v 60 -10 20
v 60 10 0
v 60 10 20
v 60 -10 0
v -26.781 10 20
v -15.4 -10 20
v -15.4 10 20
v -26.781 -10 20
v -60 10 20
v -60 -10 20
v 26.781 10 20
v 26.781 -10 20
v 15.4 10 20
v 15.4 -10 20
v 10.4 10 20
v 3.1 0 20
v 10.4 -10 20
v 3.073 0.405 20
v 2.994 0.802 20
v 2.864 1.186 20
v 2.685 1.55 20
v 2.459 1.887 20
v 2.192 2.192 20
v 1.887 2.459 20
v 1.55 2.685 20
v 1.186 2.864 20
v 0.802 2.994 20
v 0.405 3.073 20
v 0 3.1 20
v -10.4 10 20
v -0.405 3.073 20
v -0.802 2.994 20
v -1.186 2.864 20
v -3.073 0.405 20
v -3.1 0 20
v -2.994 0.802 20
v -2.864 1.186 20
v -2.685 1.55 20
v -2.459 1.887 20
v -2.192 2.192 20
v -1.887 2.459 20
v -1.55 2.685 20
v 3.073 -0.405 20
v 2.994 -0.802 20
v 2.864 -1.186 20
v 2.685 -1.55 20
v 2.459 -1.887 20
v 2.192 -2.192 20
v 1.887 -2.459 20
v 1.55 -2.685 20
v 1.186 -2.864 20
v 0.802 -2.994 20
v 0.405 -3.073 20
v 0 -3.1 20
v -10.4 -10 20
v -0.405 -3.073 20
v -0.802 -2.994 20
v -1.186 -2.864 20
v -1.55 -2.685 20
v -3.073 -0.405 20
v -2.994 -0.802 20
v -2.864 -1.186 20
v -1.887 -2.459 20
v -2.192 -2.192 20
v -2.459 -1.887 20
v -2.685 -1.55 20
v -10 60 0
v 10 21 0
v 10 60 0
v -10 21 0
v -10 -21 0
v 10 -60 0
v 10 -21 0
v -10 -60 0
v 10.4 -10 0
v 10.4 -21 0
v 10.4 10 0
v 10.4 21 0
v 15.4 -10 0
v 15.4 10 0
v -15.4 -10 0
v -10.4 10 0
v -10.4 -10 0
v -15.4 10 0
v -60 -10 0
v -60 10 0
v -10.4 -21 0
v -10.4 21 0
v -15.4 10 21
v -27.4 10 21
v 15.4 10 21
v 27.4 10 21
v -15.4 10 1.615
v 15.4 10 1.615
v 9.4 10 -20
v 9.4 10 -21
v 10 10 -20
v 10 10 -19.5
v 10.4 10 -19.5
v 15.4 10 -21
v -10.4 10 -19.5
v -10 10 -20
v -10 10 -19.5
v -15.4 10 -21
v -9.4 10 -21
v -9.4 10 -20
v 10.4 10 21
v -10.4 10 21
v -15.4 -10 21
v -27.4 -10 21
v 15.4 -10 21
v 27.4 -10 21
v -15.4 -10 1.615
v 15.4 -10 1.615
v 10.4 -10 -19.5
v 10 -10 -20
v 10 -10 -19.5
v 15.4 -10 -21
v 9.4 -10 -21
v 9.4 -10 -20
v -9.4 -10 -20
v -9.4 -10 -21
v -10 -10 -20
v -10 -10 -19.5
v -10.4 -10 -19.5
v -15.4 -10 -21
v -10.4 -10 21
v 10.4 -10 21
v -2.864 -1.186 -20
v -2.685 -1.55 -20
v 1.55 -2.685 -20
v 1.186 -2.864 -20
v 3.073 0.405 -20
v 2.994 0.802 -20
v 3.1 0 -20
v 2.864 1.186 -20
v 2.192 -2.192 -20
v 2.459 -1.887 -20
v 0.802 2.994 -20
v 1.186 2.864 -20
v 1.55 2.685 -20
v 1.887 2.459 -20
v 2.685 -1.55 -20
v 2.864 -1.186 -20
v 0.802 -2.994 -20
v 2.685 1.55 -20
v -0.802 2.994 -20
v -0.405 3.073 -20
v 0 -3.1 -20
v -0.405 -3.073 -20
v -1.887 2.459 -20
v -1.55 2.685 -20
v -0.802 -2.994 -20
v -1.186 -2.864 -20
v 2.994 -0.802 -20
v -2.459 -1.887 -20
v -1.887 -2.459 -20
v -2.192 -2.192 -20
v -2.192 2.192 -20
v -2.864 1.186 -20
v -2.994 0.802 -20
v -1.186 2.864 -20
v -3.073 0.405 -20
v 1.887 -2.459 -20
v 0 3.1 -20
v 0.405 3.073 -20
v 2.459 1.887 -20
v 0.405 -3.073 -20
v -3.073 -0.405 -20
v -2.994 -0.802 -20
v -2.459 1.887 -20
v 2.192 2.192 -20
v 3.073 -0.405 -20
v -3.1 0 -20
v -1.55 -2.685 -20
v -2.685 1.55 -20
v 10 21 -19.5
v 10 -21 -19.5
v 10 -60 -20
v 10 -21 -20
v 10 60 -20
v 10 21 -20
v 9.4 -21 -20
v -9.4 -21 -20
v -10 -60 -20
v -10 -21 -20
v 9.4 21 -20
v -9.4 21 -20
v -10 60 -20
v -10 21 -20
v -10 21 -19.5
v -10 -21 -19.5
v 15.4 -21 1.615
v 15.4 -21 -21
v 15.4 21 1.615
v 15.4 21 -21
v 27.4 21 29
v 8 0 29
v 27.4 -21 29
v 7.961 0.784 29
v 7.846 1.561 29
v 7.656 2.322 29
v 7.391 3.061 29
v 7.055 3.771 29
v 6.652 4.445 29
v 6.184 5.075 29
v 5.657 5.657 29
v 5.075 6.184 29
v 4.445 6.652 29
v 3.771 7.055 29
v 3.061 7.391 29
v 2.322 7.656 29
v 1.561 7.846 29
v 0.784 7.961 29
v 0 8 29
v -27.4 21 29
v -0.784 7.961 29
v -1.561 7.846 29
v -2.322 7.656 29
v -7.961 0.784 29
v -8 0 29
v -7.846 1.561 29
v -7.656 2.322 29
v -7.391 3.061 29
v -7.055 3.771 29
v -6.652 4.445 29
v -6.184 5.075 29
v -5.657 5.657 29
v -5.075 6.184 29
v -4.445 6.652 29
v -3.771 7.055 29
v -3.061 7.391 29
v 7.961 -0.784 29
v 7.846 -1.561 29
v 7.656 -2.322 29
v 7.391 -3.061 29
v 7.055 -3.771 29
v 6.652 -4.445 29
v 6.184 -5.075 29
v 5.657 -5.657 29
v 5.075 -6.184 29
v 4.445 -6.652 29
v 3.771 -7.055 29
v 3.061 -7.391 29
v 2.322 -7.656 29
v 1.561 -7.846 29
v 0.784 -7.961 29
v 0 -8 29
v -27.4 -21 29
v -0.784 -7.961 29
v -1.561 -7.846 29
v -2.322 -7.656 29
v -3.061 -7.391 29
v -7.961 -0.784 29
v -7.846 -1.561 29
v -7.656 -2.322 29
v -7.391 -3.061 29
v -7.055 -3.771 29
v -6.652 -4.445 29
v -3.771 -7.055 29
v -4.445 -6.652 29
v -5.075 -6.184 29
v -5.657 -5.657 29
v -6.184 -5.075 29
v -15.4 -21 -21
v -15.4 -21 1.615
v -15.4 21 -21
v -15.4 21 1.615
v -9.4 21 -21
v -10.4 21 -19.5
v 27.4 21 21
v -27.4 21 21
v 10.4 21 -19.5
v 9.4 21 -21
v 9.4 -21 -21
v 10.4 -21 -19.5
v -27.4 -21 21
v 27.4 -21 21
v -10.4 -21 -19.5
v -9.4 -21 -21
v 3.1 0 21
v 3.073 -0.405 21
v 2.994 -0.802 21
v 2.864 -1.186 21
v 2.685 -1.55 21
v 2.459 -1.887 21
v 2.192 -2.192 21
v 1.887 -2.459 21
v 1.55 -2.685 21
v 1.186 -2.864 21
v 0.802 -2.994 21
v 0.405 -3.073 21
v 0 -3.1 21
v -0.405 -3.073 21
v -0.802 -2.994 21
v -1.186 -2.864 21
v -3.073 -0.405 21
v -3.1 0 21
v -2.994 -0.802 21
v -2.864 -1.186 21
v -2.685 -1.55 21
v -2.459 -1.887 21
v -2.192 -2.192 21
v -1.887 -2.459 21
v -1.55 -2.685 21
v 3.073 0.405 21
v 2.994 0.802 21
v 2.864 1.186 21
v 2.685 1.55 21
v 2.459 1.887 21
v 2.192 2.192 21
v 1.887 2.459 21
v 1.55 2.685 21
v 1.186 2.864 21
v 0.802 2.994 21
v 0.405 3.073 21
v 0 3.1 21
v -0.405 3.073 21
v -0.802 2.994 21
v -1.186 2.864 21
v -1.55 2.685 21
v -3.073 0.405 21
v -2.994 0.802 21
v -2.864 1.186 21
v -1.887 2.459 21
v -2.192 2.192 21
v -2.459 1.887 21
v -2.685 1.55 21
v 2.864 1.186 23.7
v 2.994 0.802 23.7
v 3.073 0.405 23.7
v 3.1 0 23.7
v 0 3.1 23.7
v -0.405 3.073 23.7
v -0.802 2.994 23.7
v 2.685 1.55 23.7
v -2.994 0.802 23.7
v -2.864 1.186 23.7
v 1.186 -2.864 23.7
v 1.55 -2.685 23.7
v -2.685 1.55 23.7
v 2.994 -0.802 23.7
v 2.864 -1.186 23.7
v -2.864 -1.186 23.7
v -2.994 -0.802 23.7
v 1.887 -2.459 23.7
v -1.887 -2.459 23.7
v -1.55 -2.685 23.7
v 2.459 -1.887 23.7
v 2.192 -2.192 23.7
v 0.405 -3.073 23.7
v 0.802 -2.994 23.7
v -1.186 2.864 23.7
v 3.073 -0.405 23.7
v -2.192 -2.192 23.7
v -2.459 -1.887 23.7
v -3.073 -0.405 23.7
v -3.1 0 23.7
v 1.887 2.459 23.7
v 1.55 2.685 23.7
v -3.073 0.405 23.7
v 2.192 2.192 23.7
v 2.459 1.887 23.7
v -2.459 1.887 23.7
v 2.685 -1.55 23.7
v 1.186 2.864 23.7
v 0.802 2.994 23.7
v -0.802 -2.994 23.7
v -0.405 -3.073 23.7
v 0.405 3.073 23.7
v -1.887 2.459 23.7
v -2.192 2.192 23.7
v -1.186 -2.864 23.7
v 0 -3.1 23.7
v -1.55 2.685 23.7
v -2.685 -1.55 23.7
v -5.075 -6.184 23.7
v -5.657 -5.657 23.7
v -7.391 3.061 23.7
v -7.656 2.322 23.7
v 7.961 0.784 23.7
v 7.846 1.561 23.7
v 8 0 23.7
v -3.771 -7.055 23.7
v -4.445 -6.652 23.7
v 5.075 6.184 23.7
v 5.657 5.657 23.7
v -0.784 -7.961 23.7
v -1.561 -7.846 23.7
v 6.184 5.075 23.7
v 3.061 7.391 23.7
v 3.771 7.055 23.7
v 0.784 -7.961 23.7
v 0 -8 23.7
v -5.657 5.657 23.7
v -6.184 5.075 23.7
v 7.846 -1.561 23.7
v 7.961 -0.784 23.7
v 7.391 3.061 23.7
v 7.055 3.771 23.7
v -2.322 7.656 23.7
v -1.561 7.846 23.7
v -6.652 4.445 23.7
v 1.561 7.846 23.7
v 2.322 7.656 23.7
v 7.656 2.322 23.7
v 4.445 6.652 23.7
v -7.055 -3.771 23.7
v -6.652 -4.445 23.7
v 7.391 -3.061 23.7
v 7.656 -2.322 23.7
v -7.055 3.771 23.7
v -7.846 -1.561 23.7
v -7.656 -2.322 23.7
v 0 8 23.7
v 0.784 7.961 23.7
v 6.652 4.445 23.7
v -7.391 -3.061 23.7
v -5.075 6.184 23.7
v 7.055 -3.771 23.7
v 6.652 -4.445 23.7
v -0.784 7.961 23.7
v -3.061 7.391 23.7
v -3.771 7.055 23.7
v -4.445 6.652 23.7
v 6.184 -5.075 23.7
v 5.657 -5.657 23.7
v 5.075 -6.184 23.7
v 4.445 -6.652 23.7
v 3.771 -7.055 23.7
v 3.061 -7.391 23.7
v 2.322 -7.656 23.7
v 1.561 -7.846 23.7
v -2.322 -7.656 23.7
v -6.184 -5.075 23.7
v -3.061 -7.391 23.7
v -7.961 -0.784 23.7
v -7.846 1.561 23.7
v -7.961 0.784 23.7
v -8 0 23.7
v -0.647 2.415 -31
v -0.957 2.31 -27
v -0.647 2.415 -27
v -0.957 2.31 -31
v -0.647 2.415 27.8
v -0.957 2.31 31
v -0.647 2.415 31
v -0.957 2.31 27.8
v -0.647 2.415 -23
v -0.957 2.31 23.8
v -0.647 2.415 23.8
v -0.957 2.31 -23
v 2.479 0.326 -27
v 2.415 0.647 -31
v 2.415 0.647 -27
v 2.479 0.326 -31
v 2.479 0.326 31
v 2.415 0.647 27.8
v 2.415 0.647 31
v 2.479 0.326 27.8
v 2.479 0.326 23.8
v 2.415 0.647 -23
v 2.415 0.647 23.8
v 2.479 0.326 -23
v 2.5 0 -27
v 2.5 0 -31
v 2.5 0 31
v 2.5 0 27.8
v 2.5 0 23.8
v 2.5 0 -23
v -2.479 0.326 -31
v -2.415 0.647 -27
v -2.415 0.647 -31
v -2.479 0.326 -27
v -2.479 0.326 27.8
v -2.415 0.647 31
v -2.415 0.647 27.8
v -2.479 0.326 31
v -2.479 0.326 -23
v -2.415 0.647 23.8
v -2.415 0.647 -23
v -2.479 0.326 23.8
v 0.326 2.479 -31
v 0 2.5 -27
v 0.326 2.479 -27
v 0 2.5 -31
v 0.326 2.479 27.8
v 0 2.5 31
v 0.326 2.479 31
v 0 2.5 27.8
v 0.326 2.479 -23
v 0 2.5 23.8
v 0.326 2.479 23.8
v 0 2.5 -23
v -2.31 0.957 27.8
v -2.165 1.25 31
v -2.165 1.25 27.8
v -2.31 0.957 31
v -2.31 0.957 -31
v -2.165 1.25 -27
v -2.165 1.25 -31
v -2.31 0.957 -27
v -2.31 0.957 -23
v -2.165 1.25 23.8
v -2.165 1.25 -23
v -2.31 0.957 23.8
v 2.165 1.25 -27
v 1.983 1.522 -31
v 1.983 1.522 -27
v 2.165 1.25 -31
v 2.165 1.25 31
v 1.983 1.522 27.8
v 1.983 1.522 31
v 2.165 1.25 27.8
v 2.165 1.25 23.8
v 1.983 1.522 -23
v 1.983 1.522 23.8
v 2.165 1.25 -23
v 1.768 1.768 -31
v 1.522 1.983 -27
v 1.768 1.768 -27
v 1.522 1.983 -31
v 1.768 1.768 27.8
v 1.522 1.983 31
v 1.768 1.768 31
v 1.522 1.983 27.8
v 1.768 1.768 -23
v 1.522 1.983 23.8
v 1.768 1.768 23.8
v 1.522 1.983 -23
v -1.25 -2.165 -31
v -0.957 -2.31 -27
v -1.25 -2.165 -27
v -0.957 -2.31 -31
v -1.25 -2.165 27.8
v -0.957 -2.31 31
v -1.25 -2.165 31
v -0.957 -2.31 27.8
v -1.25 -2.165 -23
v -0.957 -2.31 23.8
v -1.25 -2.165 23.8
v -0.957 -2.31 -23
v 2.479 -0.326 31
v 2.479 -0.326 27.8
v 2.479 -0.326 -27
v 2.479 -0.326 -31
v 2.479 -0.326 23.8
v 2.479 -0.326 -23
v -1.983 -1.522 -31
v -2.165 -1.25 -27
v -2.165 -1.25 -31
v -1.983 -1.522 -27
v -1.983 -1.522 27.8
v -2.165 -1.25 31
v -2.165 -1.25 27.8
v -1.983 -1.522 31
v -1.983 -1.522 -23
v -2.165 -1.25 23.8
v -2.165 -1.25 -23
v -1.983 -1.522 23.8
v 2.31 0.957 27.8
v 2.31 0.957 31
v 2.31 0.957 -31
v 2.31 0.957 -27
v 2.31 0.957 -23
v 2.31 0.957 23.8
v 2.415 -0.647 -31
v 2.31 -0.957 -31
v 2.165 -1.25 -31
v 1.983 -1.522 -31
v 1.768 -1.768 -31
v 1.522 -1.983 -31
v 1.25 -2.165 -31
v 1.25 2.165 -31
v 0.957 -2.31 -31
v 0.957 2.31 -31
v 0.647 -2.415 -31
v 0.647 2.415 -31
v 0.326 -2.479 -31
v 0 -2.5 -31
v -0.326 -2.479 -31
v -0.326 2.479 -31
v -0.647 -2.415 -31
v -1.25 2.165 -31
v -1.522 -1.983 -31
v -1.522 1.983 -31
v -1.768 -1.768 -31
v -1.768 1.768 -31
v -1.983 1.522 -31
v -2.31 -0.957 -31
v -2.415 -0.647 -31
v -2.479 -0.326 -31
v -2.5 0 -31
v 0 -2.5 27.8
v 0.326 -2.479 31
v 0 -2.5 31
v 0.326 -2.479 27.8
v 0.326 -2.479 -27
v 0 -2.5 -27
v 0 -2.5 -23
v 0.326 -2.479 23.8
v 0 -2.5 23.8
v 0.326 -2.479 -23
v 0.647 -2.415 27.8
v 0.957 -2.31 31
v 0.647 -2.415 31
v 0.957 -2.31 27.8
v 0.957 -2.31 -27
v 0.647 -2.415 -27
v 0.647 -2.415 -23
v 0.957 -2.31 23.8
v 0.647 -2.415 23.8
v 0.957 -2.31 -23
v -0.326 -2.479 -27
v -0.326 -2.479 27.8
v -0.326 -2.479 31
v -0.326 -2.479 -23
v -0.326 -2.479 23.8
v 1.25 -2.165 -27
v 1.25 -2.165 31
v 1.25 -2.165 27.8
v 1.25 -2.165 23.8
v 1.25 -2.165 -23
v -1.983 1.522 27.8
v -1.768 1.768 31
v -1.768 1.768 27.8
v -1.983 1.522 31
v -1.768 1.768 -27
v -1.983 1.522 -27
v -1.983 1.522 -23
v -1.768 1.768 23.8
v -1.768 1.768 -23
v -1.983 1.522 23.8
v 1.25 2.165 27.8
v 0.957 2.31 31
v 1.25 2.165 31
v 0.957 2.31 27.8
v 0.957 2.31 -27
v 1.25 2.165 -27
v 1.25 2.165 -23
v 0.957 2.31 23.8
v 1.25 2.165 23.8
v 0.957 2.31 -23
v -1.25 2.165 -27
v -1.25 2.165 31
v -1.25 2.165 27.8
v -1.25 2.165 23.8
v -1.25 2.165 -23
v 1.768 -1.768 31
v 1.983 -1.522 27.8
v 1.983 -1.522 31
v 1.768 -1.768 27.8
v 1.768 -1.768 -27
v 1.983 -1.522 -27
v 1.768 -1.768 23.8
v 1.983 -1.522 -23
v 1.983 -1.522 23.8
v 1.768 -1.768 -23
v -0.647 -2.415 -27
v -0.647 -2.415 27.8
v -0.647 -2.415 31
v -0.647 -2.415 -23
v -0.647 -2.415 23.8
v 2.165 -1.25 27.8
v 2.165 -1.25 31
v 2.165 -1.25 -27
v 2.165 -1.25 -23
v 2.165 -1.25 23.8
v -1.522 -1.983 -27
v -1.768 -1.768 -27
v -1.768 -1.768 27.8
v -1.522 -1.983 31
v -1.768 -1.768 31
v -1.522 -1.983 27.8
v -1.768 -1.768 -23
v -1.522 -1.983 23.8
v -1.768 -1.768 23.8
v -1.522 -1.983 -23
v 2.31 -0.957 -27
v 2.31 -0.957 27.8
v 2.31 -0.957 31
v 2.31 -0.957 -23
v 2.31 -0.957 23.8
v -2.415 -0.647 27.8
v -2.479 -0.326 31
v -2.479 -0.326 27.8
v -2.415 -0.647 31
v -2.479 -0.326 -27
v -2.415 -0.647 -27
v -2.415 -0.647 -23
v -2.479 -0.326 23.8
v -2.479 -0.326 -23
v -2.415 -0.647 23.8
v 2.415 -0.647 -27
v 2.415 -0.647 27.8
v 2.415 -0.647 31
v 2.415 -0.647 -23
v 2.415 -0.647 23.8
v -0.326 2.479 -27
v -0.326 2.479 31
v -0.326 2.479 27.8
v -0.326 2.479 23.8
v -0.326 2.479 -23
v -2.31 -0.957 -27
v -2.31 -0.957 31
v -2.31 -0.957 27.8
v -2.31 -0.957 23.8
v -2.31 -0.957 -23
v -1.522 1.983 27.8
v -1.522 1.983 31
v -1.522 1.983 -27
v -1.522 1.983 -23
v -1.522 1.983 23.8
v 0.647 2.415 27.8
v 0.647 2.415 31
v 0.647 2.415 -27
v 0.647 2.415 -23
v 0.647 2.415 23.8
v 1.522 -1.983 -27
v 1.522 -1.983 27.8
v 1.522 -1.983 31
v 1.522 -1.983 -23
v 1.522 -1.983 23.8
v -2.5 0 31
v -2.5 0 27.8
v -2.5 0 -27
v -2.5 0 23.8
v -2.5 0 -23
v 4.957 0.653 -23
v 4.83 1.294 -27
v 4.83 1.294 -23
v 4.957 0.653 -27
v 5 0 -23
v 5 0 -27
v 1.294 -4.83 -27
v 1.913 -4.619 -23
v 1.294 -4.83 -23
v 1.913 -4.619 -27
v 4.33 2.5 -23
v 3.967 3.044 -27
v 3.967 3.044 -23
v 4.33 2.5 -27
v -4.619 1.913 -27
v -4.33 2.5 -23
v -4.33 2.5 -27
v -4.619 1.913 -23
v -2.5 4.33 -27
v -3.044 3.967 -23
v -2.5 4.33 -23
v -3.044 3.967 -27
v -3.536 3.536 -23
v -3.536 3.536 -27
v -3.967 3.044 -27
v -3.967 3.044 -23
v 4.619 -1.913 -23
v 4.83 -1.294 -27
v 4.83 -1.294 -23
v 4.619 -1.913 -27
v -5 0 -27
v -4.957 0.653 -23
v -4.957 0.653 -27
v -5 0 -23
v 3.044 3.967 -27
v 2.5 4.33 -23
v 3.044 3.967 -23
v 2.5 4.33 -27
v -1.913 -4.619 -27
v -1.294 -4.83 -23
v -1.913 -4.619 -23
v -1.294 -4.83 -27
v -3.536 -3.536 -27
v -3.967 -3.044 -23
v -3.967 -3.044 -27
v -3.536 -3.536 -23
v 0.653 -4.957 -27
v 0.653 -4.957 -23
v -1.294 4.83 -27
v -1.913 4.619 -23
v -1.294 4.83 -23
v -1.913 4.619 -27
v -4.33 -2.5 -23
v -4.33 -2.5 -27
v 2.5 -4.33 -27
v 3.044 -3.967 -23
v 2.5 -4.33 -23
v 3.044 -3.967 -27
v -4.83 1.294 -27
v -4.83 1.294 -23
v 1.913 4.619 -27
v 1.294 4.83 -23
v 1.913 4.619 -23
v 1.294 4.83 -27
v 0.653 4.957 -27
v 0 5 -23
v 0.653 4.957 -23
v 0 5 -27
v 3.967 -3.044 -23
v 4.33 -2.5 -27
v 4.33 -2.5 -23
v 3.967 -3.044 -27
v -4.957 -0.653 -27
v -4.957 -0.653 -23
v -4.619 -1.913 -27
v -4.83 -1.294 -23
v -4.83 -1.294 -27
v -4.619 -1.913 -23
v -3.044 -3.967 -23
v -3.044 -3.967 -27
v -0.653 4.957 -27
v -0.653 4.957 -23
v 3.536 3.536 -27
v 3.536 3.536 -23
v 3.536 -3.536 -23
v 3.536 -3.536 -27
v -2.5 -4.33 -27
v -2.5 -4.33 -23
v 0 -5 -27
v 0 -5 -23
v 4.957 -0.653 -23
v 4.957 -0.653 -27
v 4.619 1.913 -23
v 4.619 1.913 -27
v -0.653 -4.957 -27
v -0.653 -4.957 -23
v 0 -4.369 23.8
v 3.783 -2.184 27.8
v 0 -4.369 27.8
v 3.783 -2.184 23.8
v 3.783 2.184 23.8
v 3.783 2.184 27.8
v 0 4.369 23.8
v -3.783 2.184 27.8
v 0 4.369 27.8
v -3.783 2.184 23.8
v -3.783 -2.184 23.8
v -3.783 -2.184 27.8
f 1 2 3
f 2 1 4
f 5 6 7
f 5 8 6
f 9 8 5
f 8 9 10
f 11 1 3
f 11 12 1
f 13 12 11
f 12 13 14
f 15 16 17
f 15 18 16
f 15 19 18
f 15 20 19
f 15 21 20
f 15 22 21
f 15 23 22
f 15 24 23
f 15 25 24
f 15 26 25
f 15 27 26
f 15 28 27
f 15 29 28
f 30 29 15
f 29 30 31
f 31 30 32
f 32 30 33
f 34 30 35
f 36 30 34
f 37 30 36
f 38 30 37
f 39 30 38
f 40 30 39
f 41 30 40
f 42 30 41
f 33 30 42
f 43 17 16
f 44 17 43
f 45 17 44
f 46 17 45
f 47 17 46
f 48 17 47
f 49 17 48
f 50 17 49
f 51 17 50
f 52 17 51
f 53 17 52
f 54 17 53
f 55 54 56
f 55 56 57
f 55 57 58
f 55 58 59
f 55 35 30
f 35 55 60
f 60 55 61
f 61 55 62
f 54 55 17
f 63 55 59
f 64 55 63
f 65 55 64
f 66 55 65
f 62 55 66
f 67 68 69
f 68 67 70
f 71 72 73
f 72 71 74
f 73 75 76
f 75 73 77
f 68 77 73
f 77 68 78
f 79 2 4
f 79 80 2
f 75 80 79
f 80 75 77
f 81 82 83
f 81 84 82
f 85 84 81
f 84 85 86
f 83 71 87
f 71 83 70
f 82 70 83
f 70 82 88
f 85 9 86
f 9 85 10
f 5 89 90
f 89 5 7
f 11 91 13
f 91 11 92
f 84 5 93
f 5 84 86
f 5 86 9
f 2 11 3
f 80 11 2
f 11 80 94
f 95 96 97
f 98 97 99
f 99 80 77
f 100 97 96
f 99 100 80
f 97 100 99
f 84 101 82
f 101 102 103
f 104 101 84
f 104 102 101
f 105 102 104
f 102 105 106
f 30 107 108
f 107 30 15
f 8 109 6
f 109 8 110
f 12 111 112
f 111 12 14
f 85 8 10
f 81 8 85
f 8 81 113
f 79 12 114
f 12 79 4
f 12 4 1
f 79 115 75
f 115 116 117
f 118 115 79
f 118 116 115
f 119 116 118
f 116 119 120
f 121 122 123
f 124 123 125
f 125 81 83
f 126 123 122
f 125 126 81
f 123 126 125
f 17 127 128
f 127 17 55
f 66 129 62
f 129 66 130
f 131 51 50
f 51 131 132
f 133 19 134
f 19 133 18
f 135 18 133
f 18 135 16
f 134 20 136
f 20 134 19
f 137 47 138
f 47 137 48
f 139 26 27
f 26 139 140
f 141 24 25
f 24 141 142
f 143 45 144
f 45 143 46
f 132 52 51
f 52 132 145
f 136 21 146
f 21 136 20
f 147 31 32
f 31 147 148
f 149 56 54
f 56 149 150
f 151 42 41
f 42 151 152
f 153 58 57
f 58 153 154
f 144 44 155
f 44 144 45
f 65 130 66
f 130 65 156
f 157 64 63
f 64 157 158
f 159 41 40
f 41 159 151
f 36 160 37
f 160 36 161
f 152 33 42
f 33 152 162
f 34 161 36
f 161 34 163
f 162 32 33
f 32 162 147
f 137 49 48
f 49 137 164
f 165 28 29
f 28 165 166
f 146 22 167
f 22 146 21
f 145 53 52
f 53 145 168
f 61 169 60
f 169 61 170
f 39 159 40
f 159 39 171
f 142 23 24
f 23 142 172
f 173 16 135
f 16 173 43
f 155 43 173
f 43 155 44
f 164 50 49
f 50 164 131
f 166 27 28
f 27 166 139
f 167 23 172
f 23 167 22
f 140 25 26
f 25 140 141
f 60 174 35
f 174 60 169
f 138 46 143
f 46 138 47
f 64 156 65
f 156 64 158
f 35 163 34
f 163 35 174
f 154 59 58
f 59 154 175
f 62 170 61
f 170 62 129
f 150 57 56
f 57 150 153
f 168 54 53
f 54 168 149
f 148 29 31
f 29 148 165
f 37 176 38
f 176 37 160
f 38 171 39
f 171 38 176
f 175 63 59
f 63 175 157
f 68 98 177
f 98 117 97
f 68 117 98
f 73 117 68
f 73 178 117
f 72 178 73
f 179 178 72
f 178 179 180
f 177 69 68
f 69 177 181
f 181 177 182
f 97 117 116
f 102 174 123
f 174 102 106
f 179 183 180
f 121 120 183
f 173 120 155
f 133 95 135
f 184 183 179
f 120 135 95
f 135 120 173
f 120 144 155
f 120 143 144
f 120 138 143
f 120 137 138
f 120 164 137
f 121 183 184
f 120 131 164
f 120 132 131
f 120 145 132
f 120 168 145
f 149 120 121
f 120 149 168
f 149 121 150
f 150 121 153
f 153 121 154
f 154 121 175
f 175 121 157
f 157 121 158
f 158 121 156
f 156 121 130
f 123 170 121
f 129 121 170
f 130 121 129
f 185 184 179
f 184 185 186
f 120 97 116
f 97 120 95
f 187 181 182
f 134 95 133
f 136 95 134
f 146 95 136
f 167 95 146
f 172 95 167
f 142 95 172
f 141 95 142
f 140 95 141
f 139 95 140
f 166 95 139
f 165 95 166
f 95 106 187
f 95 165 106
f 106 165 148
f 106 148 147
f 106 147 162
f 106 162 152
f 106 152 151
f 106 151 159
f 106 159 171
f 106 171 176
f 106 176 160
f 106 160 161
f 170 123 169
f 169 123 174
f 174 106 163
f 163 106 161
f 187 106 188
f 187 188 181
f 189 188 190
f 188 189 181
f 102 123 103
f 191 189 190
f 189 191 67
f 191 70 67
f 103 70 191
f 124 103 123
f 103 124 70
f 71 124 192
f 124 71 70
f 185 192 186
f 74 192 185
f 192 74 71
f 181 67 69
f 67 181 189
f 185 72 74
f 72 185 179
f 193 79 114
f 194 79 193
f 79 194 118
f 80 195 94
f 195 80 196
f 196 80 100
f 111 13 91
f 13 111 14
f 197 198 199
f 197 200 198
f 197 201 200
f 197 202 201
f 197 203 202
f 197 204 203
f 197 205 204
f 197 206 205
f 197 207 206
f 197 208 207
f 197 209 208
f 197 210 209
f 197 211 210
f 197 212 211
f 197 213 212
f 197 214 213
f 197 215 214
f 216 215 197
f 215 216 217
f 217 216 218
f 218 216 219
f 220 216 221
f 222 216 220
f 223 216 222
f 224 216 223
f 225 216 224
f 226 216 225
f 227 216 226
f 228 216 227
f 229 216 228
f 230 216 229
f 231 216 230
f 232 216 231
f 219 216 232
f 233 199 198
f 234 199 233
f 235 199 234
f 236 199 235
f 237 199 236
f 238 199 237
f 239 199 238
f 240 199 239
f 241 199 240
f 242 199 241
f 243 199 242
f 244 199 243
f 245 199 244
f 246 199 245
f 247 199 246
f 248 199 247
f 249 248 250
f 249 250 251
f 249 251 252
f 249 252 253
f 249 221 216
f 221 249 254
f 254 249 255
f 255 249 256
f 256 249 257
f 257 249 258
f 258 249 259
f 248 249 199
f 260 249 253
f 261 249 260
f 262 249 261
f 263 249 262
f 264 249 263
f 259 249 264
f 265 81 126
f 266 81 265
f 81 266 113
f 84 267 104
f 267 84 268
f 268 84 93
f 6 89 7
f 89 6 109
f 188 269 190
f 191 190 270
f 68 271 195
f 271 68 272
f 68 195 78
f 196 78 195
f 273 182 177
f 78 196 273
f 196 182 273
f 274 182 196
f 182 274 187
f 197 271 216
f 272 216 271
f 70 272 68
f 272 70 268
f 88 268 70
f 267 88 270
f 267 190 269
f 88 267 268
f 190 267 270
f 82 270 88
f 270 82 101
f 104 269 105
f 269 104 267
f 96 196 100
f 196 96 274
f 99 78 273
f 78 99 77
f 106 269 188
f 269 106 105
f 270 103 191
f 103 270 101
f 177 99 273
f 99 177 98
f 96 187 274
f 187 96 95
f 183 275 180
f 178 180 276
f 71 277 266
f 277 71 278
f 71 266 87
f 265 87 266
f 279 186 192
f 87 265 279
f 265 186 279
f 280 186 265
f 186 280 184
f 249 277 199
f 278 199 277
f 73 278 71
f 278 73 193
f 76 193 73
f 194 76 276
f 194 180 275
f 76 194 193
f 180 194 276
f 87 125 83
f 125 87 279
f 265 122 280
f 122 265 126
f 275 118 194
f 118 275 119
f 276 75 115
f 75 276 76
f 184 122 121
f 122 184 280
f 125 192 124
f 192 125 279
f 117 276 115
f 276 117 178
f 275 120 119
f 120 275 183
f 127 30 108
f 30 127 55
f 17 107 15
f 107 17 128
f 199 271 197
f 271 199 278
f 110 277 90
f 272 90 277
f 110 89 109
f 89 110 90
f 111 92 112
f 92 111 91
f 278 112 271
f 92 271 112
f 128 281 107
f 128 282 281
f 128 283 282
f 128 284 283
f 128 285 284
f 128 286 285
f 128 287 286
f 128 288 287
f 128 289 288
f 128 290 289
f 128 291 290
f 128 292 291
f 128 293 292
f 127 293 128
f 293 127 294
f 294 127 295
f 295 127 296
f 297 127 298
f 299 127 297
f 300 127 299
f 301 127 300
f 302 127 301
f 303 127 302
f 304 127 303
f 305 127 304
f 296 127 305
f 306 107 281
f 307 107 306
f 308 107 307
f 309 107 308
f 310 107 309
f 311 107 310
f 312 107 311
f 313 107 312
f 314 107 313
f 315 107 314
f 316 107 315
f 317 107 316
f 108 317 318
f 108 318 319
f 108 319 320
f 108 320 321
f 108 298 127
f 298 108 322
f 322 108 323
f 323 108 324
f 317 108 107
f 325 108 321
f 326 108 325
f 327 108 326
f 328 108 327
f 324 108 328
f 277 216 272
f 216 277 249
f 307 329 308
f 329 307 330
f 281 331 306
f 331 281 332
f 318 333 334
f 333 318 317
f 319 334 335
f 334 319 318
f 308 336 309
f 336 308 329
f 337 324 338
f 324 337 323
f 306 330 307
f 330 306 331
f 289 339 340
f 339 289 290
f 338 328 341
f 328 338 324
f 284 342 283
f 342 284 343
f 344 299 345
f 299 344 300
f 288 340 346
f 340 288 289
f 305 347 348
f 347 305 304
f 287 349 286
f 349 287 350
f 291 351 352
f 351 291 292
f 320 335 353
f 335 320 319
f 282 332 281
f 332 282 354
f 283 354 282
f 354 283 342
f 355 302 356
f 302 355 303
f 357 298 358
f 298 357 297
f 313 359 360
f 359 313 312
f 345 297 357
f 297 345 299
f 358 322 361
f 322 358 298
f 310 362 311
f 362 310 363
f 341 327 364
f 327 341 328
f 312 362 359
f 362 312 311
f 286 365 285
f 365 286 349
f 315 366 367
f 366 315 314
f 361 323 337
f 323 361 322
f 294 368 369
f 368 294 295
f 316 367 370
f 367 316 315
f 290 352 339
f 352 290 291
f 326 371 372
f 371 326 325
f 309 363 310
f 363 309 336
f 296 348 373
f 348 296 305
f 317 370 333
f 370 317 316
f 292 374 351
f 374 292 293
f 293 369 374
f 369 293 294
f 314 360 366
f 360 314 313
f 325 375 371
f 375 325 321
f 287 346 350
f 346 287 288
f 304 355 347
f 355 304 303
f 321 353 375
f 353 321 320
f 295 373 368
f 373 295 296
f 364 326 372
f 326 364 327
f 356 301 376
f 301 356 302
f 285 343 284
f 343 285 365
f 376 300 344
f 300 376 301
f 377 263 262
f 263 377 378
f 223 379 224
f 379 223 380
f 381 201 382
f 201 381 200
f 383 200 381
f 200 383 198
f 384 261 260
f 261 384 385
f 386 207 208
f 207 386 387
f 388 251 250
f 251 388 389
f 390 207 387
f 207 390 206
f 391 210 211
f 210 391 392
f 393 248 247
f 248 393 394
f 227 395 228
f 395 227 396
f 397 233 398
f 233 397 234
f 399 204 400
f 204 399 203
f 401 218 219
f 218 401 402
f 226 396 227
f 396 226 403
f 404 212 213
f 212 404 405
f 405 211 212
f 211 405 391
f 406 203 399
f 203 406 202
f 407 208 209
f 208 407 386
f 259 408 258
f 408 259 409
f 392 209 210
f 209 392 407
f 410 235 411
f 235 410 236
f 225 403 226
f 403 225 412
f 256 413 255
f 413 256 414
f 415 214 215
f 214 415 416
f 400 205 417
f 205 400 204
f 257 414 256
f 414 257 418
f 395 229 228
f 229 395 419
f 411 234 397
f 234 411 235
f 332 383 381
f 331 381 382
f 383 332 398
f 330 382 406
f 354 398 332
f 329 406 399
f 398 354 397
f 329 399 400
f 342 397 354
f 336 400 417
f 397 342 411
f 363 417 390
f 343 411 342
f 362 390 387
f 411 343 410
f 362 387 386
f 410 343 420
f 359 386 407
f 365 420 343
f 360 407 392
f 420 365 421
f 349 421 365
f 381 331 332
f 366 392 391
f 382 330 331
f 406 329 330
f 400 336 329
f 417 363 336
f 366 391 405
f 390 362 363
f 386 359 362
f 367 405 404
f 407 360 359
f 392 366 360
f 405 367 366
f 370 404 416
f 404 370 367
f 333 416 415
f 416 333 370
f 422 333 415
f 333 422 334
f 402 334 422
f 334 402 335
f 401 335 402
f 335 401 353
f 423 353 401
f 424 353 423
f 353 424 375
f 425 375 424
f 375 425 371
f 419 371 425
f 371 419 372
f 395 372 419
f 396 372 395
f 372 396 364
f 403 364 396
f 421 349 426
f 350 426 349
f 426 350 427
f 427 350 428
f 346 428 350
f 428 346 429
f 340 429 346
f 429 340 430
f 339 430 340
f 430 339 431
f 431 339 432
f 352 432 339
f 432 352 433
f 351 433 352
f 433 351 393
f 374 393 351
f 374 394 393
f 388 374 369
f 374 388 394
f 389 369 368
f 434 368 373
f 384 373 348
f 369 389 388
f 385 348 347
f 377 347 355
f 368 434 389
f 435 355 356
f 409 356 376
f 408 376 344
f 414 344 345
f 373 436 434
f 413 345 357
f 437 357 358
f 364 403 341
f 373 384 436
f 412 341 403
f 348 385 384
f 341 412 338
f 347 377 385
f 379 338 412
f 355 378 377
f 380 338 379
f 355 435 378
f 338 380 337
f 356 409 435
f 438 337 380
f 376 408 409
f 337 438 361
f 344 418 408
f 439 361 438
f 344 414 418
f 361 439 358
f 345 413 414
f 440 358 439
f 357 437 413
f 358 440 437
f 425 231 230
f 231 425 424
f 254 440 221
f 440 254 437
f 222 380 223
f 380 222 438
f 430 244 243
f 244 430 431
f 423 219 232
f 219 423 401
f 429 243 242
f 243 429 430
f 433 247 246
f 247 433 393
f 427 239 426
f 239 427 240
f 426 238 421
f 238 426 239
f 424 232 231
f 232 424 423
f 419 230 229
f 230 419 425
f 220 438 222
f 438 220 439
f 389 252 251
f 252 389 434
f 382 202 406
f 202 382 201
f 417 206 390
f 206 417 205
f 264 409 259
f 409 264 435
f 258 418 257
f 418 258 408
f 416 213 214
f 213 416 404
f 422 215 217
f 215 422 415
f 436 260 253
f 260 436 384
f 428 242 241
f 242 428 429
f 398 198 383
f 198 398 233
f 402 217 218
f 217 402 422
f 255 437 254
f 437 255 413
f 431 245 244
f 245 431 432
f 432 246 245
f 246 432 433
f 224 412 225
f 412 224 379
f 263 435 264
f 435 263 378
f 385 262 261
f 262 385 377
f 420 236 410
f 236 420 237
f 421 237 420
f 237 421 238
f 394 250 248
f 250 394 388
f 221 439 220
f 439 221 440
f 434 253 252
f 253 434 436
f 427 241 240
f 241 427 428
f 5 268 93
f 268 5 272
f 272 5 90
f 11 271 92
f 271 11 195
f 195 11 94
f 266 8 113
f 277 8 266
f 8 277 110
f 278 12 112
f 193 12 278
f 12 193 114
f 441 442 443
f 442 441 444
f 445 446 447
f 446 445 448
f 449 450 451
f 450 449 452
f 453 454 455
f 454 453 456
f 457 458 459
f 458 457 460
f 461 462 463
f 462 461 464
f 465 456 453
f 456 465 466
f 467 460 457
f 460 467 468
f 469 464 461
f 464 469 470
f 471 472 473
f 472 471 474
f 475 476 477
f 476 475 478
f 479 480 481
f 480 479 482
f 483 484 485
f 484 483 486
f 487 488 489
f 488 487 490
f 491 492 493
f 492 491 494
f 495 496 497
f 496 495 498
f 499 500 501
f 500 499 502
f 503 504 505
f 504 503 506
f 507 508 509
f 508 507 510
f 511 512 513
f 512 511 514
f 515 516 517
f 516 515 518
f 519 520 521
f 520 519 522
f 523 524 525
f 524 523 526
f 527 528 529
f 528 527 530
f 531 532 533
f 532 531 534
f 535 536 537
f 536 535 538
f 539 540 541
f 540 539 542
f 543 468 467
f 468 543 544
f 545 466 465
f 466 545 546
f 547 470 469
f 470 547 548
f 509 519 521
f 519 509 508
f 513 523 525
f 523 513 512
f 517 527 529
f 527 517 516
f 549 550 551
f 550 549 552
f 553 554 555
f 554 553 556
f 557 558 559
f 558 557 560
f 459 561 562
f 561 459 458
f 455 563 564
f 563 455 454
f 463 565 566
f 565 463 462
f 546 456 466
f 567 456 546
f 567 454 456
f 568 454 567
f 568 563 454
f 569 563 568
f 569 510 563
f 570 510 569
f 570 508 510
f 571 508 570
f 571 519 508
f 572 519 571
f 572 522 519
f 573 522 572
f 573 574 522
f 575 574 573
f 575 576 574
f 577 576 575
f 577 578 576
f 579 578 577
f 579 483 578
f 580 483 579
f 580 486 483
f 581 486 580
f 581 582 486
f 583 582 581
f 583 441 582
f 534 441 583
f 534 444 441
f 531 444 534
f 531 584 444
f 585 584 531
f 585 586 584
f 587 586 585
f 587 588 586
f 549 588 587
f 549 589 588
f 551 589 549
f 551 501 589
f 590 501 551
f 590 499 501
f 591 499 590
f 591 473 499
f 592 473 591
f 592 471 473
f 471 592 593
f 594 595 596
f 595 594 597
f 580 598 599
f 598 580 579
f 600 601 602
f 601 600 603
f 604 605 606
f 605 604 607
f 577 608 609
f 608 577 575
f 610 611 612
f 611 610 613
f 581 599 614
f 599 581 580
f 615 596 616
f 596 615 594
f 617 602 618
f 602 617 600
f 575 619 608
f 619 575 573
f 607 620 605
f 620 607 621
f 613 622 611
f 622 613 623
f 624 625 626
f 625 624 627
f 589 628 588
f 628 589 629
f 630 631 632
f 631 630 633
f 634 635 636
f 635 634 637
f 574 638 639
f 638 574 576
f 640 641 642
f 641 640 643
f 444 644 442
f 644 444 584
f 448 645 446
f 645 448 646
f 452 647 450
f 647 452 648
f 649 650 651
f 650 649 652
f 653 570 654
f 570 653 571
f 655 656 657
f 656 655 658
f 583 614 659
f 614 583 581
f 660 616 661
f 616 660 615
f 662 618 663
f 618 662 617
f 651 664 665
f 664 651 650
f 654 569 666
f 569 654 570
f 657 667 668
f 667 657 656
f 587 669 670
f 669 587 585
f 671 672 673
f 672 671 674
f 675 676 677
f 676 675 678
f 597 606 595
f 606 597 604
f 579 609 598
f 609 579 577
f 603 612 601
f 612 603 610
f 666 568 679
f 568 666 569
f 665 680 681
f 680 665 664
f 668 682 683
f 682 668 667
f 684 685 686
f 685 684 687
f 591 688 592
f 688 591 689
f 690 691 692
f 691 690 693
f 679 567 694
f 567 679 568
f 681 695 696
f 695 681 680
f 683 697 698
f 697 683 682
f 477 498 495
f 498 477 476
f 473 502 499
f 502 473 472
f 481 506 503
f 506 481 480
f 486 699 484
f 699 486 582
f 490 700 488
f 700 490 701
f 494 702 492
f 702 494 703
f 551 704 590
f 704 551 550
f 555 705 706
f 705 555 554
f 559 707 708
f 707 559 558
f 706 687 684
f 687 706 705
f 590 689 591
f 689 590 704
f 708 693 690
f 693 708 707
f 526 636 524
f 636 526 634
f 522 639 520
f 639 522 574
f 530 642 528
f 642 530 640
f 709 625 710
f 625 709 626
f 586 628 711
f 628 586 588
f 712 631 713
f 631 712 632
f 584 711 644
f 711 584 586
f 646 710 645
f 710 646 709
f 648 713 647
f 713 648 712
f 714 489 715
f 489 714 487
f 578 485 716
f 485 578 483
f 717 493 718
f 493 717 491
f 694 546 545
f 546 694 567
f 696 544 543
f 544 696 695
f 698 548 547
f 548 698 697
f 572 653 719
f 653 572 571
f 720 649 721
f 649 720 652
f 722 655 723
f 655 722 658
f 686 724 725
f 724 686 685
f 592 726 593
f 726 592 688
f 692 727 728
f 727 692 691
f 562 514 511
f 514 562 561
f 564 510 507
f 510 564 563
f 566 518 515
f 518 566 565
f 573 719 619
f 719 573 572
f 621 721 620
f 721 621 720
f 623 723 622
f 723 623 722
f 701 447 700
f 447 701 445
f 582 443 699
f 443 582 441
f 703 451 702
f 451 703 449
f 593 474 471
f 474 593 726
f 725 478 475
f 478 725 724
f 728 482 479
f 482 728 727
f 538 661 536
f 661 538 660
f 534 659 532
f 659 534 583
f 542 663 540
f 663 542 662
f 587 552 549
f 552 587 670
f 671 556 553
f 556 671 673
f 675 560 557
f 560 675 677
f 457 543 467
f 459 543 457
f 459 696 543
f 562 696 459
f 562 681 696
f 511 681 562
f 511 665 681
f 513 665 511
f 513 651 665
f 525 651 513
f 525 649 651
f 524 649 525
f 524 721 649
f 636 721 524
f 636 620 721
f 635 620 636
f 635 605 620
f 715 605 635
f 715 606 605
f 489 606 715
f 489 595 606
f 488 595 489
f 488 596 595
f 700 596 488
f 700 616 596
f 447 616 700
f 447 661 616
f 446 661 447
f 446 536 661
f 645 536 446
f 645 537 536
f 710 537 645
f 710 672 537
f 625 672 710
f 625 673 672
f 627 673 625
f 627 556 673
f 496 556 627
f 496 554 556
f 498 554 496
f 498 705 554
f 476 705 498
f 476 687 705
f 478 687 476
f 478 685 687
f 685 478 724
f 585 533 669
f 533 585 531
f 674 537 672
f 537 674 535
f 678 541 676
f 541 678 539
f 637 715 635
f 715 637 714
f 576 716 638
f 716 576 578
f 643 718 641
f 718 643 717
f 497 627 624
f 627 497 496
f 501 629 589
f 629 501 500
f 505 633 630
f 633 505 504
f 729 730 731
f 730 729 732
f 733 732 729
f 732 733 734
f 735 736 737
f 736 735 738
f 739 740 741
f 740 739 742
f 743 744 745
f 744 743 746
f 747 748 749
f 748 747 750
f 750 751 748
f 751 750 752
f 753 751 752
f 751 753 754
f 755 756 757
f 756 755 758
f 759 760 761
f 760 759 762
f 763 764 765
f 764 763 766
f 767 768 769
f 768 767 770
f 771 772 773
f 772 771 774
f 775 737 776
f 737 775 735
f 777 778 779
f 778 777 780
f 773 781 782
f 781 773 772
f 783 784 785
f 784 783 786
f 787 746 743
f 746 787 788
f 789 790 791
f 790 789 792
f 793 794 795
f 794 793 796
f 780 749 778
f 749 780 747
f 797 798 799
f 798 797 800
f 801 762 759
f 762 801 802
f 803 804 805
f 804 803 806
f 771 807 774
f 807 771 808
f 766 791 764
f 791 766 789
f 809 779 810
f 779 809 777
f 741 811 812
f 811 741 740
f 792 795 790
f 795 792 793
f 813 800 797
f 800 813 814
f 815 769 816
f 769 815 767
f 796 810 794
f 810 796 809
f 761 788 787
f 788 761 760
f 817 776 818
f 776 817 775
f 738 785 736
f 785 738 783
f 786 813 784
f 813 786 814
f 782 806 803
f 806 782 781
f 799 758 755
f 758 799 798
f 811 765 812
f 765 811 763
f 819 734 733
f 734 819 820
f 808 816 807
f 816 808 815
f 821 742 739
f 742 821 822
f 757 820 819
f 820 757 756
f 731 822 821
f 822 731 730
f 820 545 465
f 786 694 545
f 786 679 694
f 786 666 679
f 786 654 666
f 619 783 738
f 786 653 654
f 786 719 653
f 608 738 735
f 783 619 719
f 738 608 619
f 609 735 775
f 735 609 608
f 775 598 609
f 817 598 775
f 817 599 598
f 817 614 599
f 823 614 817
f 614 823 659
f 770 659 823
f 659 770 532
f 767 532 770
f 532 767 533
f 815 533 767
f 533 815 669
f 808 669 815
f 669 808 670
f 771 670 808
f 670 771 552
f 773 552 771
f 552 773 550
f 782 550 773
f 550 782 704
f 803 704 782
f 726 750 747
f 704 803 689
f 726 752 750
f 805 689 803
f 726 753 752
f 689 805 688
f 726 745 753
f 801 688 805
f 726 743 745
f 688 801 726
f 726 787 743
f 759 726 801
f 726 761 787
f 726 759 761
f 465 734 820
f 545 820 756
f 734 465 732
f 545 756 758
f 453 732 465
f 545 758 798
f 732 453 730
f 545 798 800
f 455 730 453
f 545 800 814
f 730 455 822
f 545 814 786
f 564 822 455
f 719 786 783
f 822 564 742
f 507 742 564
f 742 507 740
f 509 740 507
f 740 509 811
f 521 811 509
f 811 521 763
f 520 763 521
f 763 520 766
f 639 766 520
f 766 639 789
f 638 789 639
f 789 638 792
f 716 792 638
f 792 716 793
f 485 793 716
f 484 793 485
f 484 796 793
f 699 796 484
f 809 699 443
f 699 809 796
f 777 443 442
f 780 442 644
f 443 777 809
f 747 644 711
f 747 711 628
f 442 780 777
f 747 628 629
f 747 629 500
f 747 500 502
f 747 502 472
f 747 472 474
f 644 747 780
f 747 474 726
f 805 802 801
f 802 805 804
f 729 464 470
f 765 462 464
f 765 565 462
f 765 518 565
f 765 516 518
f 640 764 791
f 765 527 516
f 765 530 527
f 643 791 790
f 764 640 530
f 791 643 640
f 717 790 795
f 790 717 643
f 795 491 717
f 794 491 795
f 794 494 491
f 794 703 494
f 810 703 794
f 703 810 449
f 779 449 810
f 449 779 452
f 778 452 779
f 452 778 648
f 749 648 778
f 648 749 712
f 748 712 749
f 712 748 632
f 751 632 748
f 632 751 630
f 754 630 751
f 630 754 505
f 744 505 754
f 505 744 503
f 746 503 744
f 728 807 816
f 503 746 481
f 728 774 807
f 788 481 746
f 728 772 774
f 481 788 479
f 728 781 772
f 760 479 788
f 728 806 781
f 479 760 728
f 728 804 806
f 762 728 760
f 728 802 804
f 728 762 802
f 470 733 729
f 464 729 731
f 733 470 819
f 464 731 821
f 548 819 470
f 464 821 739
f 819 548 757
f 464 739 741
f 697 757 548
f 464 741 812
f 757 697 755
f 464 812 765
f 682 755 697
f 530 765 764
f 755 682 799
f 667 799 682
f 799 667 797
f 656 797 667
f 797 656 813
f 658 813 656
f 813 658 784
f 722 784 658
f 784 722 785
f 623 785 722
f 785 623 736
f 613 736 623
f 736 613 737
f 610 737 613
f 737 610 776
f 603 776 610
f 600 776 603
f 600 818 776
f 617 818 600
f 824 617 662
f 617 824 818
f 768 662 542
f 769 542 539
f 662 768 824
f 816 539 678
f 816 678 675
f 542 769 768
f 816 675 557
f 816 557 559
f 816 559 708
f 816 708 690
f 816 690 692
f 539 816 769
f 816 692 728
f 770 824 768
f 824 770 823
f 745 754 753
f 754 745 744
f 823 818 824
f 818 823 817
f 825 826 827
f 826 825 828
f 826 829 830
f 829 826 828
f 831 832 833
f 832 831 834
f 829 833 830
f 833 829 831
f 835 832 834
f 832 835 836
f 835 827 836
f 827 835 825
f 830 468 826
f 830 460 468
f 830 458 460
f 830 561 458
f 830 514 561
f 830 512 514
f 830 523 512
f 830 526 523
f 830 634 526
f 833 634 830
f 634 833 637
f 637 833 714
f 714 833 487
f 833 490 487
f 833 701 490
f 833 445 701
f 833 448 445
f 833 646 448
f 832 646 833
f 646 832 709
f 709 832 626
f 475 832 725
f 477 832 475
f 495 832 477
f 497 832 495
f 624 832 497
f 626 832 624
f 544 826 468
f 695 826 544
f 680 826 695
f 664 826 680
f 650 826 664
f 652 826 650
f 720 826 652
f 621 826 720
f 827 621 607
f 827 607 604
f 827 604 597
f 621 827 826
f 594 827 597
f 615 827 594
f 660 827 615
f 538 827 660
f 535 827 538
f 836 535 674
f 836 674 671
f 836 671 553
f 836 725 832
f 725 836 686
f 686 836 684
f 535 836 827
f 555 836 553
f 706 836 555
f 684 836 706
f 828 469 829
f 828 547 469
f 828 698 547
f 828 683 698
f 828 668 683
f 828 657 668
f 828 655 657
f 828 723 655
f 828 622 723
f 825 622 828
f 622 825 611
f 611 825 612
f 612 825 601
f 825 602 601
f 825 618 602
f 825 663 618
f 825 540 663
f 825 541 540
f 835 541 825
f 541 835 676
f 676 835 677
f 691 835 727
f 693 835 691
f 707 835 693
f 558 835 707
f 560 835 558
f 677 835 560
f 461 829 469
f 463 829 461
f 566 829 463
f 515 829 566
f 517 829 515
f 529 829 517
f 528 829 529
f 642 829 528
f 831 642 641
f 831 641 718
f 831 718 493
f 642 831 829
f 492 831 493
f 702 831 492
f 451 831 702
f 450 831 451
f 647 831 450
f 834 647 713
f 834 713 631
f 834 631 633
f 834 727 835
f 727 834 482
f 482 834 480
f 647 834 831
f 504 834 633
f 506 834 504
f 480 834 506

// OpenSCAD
// Candidate v1.3: four triangular concave-corner fill blocks.
//
// Base: accepted v0.7 eaves12 geometry. v0.9/v1.0/v1.1/v1.2 are not
// imported. Each corner block is a real triangular prism: broad at the roof,
// tapering continuously toward z=0, and overlapping the U side wall.

use <../perpendicular-u-joint-guard-v0.7/perpendicular_double_u_guard.scad>;

$fn = 48;
PART = "candidate_iso";

// Explicit v0.7 interface values.
roof_x_outer = 27.4;       // accepted eaves12 roof: -27.4..+27.4
side_wall_x_outer = 15.4;  // existing side-wall outer edge
blue_tube_x_outer = 10.0;  // blue lower 20x20 tube half-width
plate_y_inner = 10.0;
plate_y_outer = 21.0;
plate_depth_y = plate_y_outer - plate_y_inner; // 11 mm per front/back U plate

// The top edge is 0.5 mm inside the roof volume (roof underside z=21), and
// the lower point enters the side wall by 1 mm in X.  The XZ area therefore
// has positive overlap at both ends, not edge-only contact.
triangle_top_z = 21.5;
triangle_bottom_z = 0.0;
triangle_roof_overlap_z = triangle_top_z - 21.0;
triangle_side_overlap_x = 1.0;
triangle_inner_x = side_wall_x_outer - triangle_side_overlap_x; // 14.4

// Bottom retaining-hook contract copied from v0.7 for explicit verification.
hook_height_z = 1.5;
u_bottom_z = -21.0;
hook_top_z = u_bottom_z + hook_height_z; // -19.5

assert(plate_depth_y == 11, "每个三角块的前后板深必须是 11 mm");
assert(triangle_top_z > 21 && triangle_bottom_z == 0,
       "三角块上端必须搭入屋檐、下端落到 z=0");
assert(triangle_inner_x > blue_tube_x_outer,
       "三角块下端不得进入蓝色方管 x=-10..+10 包络");
assert(triangle_side_overlap_x > 0 && triangle_roof_overlap_z > 0,
       "三角块必须与屋檐和侧墙都有正重叠");
assert(hook_height_z == 1.5 && u_bottom_z == -21 && hook_top_z == -19.5,
       "底部卡脚必须保持 z=-21..-19.5");

// A polygon in XZ is extruded only through the corresponding front/back U
// plate. The center y=-10..+10 passage remains open.
module triangular_fill_xz(points, yc) {
    translate([0, yc, 0])
        rotate([90, 0, 0])
            linear_extrude(height = plate_depth_y,
                           center = true,
                           convexity = 10)
                polygon(points = points);
}

module front_neg_x_triangle() {
    // -X roof end -> +X inward. Top wide, lower point at the side wall.
    triangular_fill_xz([
        [-roof_x_outer, 21.0],
        [-triangle_inner_x, triangle_top_z],
        [-triangle_inner_x, triangle_bottom_z]
    ], (plate_y_inner + plate_y_outer) / 2);
}

module front_pos_x_triangle() {
    // +X roof end -> -X inward. Mirrored triangle.
    triangular_fill_xz([
        [roof_x_outer, 21.0],
        [triangle_inner_x, triangle_top_z],
        [triangle_inner_x, triangle_bottom_z]
    ], (plate_y_inner + plate_y_outer) / 2);
}

module back_neg_x_triangle() {
    triangular_fill_xz([
        [-roof_x_outer, 21.0],
        [-triangle_inner_x, triangle_top_z],
        [-triangle_inner_x, triangle_bottom_z]
    ], -(plate_y_inner + plate_y_outer) / 2);
}

module back_pos_x_triangle() {
    triangular_fill_xz([
        [roof_x_outer, 21.0],
        [triangle_inner_x, triangle_top_z],
        [triangle_inner_x, triangle_bottom_z]
    ], -(plate_y_inner + plate_y_outer) / 2);
}

module front_two_triangular_fills() {
    union() {
        front_neg_x_triangle();
        front_pos_x_triangle();
    }
}

module back_two_triangular_fills() {
    union() {
        back_neg_x_triangle();
        back_pos_x_triangle();
    }
}

module all_four_triangular_fills() {
    union() {
        front_two_triangular_fills();
        back_two_triangular_fills();
    }
}

module candidate_print_solid() {
    // Final hole operation is deliberately after the complete four-block
    // union; this preserves a true Z through-hole and the round nut pocket.
    difference() {
        union() {
            double_u_clip();
            all_four_triangular_fills();
        }
        vertical_screw_relief();
    }
}

module candidate_clip() {
    candidate_print_solid();
}

module candidate_assembly_iso() {
    upper_long_tube();
    lower_cross_tube();
    color([0.96, 0.39, 0.08]) double_u_clip();
    color([0.86, 0.13, 0.08]) front_two_triangular_fills();
    color([0.62, 0.12, 0.52]) back_two_triangular_fills();
    vertical_joint_screw();
}

module candidate_front_xz() {
    lower_cross_tube();
    color([0.96, 0.39, 0.08]) double_u_clip();
    color([0.86, 0.13, 0.08]) front_two_triangular_fills();
    vertical_joint_screw();
}

module candidate_back_xz() {
    lower_cross_tube();
    color([0.96, 0.39, 0.08]) double_u_clip();
    color([0.62, 0.12, 0.52]) back_two_triangular_fills();
    vertical_joint_screw();
}

module candidate_top_slice() {
    // At z=-0.5..2.5 the four blocks show their two front/back 11 mm bands;
    // the blue tube and the central y gap remain visible.
    slice_box = 200;
    color([0.28, 0.45, 0.78])
        intersection() {
            lower_cross_tube();
            translate([-slice_box / 2, -slice_box / 2, -0.5])
                cube([slice_box, slice_box, 3.0]);
        }
    color([0.96, 0.39, 0.08])
        intersection() {
            double_u_clip();
            translate([-slice_box / 2, -slice_box / 2, -0.5])
                cube([slice_box, slice_box, 3.0]);
        }
    color([0.86, 0.13, 0.08])
        intersection() {
            front_two_triangular_fills();
            translate([-slice_box / 2, -slice_box / 2, -0.5])
                cube([slice_box, slice_box, 3.0]);
        }
    color([0.62, 0.12, 0.52])
        intersection() {
            back_two_triangular_fills();
            translate([-slice_box / 2, -slice_box / 2, -0.5])
                cube([slice_box, slice_box, 3.0]);
        }
}

module candidate_hole_section() {
    // Center y=0 section: the bore and round nut pocket are shown without
    // confusing them with the bottom hook, which is outside this section.
    intersection() {
        candidate_print_solid();
        translate([-100, -0.4, -100]) cube([200, 0.8, 200]);
    }
}

module candidate_hook_check() {
    // Isolated lower detail: exact imported v0.7 U plate and blue tube, with
    // hook volumes highlighted only for review. This is not the print union.
    detail_box = 200;
    detail_z0 = -22;
    detail_h = 5;
    detail_y0 = 8;
    detail_ydepth = 15;
    intersection() {
        lower_cross_tube();
        translate([-detail_box / 2, detail_y0, detail_z0])
            cube([detail_box, detail_ydepth, detail_h]);
    }
    color([0.96, 0.39, 0.08])
        intersection() {
            u_plate(plate_y_inner, plate_y_outer);
            translate([-detail_box / 2, detail_y0, detail_z0])
                cube([detail_box, detail_ydepth, detail_h]);
        }
    color([0.20, 0.78, 0.20])
        intersection() {
            union() {
                translate([-13.65, 15.5, -20.25])
                    cube([3.5, 11, 1.5], center = true);
                translate([13.65, 15.5, -20.25])
                    cube([3.5, 11, 1.5], center = true);
            }
            translate([-detail_box / 2, detail_y0, detail_z0])
                cube([detail_box, detail_ydepth, detail_h]);
        }
}

if (PART == "candidate_clip") {
    candidate_clip();
} else if (PART == "candidate_front_xz") {
    candidate_front_xz();
} else if (PART == "candidate_back_xz") {
    candidate_back_xz();
} else if (PART == "candidate_top_slice") {
    candidate_top_slice();
} else if (PART == "candidate_hole_section") {
    candidate_hole_section();
} else if (PART == "candidate_hook_check") {
    candidate_hook_check();
} else {
    candidate_assembly_iso();
}
